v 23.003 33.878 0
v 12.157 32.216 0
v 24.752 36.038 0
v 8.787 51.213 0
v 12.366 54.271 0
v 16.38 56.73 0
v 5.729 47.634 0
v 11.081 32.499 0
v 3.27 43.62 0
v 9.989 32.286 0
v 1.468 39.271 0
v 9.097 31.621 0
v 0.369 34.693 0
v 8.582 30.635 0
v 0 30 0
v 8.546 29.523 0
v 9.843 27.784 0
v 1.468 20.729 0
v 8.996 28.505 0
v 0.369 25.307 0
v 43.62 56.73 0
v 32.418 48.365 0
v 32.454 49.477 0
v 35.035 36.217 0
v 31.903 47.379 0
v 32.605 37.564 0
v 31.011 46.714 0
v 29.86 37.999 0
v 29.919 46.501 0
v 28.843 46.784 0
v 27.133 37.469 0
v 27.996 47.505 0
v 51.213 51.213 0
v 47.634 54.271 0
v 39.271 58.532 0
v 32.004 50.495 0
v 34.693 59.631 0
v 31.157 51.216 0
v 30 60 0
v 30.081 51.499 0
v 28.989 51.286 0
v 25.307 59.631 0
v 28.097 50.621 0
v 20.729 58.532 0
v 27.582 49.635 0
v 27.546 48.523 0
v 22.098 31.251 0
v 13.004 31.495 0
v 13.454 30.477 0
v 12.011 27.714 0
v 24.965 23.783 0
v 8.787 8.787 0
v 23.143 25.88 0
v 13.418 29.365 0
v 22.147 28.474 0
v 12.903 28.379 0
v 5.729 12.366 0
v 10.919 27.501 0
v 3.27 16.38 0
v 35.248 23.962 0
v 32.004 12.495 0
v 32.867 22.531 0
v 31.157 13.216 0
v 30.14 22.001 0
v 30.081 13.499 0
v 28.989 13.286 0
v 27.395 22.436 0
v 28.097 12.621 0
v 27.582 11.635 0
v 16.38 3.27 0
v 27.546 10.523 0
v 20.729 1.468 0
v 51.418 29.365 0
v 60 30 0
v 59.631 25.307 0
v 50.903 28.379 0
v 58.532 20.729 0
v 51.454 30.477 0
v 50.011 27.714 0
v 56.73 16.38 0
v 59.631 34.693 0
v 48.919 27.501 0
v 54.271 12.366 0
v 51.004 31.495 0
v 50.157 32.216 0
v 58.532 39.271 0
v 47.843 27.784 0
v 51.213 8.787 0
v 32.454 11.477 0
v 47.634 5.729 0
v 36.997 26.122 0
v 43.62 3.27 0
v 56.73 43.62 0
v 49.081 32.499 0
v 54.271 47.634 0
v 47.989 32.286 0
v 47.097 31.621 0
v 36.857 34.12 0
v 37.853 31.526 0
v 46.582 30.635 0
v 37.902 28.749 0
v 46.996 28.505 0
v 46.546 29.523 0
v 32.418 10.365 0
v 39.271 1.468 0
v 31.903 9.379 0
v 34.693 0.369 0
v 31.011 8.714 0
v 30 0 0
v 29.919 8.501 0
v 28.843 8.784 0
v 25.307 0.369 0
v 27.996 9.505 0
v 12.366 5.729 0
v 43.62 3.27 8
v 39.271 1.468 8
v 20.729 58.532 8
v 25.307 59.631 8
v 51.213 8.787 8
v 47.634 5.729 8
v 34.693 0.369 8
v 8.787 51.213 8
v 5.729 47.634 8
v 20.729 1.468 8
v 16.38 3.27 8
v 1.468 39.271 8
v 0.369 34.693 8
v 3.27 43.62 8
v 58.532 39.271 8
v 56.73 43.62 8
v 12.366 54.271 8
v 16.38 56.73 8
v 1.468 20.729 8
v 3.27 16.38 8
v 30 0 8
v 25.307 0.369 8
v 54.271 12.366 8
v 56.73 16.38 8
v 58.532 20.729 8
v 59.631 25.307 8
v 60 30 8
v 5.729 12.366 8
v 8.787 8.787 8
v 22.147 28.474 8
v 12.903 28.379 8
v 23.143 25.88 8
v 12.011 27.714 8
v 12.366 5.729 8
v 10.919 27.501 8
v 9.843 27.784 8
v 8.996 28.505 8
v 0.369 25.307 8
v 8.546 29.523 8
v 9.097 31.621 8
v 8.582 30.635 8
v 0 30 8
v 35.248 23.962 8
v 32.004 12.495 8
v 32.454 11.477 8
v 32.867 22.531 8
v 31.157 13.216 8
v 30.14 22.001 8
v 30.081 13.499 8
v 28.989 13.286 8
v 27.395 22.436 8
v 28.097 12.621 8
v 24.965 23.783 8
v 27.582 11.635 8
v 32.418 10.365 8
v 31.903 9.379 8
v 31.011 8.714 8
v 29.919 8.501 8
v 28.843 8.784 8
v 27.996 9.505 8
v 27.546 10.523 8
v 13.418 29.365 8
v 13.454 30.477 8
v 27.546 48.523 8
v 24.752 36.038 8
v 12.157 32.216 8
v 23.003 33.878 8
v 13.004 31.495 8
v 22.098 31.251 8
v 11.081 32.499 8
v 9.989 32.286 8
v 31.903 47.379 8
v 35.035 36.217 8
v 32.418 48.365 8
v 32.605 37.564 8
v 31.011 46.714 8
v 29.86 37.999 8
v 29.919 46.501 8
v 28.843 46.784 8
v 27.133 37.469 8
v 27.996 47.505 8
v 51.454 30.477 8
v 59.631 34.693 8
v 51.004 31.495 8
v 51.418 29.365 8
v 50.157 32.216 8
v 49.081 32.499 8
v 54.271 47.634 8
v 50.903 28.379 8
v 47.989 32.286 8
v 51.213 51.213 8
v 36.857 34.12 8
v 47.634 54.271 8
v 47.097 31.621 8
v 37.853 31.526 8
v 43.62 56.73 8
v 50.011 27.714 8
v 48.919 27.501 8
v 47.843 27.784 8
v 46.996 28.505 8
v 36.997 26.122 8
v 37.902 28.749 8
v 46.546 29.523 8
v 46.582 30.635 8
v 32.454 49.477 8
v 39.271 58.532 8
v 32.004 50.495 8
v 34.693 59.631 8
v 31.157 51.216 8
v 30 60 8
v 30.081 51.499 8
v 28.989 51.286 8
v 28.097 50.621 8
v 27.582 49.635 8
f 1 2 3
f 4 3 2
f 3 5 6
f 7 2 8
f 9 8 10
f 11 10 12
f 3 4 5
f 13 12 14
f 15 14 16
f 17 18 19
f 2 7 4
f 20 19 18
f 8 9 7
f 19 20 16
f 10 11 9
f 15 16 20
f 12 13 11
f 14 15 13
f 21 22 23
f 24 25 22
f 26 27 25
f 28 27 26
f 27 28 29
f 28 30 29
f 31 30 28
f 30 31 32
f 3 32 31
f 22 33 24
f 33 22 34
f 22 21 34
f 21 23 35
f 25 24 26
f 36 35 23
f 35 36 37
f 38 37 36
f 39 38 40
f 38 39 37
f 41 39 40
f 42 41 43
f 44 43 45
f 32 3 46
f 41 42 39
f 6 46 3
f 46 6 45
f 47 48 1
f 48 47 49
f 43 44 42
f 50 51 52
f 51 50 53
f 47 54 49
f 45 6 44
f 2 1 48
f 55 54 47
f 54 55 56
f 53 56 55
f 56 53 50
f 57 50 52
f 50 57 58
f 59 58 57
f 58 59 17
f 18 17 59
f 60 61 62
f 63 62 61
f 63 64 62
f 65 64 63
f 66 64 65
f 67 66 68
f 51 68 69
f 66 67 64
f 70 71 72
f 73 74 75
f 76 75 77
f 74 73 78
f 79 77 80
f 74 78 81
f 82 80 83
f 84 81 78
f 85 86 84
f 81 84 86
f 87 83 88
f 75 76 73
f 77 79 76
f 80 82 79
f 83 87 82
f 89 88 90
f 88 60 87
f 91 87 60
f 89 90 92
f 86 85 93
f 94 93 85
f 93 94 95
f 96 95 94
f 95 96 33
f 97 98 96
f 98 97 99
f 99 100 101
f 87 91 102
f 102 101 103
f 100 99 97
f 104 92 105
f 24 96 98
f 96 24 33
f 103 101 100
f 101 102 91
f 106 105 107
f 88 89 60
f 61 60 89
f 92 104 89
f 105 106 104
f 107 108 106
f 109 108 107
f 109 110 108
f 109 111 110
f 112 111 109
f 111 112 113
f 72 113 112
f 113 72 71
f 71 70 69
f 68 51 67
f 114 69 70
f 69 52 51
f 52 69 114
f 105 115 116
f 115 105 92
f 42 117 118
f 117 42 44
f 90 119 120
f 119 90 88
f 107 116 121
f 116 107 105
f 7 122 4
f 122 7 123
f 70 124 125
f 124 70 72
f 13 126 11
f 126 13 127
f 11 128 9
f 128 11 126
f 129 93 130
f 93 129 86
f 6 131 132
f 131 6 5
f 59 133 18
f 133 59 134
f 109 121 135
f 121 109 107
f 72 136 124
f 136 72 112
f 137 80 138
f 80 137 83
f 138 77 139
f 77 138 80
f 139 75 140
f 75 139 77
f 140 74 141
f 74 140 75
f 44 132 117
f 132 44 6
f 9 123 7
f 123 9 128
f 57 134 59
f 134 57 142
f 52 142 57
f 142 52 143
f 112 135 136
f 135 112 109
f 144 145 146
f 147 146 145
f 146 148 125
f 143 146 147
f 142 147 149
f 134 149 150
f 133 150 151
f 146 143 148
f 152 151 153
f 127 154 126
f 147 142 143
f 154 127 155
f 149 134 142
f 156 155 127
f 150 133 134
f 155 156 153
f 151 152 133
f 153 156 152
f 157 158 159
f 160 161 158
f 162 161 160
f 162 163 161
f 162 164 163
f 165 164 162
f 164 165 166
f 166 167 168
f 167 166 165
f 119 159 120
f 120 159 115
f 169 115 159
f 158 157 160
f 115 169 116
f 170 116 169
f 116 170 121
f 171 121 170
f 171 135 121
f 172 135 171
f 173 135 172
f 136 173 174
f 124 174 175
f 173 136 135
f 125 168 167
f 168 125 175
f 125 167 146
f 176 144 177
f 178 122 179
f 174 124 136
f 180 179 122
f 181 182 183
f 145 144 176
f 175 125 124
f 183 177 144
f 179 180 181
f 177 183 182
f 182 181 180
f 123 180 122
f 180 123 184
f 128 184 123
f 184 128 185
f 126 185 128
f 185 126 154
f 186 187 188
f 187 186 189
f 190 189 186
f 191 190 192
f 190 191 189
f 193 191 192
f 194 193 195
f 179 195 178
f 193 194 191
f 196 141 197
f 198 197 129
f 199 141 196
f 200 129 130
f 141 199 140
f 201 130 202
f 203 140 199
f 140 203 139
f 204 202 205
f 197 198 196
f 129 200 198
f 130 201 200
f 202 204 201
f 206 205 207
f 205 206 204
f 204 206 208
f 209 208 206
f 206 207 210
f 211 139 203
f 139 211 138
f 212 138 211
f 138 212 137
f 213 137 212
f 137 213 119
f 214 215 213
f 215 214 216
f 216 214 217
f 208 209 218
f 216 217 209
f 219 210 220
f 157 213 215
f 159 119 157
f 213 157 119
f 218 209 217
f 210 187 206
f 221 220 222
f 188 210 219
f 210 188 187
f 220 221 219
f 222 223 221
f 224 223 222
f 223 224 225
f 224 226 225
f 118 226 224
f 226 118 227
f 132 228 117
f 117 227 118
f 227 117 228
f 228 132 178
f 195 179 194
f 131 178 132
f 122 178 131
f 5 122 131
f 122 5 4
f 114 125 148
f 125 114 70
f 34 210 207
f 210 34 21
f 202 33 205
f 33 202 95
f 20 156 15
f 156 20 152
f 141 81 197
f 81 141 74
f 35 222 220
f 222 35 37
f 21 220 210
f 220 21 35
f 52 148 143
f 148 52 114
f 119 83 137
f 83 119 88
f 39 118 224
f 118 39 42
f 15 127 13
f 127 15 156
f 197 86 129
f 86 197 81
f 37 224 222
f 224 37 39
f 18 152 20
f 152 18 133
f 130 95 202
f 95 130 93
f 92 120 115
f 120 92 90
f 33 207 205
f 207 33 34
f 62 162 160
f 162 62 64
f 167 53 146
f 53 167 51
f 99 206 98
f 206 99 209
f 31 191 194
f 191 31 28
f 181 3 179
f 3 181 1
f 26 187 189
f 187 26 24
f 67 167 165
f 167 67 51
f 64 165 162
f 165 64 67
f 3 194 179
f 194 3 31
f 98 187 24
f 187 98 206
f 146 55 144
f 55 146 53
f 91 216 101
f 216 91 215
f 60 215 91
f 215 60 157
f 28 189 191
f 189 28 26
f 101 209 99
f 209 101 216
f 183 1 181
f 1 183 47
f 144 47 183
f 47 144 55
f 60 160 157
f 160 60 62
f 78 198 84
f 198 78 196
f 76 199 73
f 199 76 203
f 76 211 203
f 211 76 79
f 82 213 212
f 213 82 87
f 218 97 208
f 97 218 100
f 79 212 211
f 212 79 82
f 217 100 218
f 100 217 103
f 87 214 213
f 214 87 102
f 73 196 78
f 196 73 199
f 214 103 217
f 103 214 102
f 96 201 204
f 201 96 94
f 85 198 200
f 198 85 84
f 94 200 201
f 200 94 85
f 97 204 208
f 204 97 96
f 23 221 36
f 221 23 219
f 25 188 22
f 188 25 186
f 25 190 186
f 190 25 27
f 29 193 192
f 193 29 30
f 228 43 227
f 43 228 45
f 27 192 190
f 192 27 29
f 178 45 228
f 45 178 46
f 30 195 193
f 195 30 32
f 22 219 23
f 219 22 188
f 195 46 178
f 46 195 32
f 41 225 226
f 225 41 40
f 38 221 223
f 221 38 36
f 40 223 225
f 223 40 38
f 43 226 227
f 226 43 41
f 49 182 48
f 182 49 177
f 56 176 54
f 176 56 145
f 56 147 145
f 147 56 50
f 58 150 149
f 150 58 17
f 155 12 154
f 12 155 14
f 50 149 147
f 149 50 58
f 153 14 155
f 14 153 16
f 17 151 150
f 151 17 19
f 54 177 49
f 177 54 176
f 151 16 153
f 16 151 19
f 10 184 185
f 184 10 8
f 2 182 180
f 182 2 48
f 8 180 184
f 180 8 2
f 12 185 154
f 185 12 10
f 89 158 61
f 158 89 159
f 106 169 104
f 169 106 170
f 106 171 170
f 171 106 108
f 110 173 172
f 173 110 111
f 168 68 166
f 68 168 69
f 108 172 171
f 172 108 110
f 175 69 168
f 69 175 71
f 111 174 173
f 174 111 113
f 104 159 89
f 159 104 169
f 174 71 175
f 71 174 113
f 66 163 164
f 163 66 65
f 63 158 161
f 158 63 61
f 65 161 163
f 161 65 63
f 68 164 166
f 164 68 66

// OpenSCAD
$fn = 32;

// ----------------------------------------------------------------------
// Spacer plate: round flange R30, 4 bolts
// ----------------------------------------------------------------------

// --- parameters (mm) ---
bore_r = 8;               // centre bore radius
bolt_r = 2.5;             // bolt hole radius
plate_t = 8;              // plate thickness, Z (extrusion height)
flange_r = 30;            // flange radius
n_bolt = 4;               // bolt hole count
ring_r = 19;              // bolt circle radius

profile = [[60, 30], [59.631, 34.693], [58.532, 39.271], [56.73, 43.62], [54.271, 47.634], [51.213, 51.213], [47.634, 54.271], [43.62, 56.73], [39.271, 58.532], [34.693, 59.631], [30, 60], [25.307, 59.631], [20.729, 58.532], [16.38, 56.73], [12.366, 54.271], [8.787, 51.213], [5.729, 47.634], [3.27, 43.62], [1.468, 39.271], [0.369, 34.693], [0, 30], [0.369, 25.307], [1.468, 20.729], [3.27, 16.38], [5.729, 12.366], [8.787, 8.787], [12.366, 5.729], [16.38, 3.27], [20.729, 1.468], [25.307, 0.369], [30, 0], [34.693, 0.369], [39.271, 1.468], [43.62, 3.27], [47.634, 5.729], [51.213, 8.787], [54.271, 12.366], [56.73, 16.38], [58.532, 20.729], [59.631, 25.307]];  // primary outline, 40 points, counter clockwise
void_1 = [[37.853, 31.526], [36.857, 34.12], [35.035, 36.217], [32.605, 37.564], [29.86, 37.999], [27.133, 37.469], [24.752, 36.038], [23.003, 33.878], [22.098, 31.251], [22.147, 28.474], [23.143, 25.88], [24.965, 23.783], [27.395, 22.436], [30.14, 22.001], [32.867, 22.531], [35.248, 23.962], [36.997, 26.122], [37.902, 28.749]];  // centre bore, 18 points
void_2 = [[51.454, 30.477], [51.004, 31.495], [50.157, 32.216], [49.081, 32.499], [47.989, 32.286], [47.097, 31.621], [46.582, 30.635], [46.546, 29.523], [46.996, 28.505], [47.843, 27.784], [48.919, 27.501], [50.011, 27.714], [50.903, 28.379], [51.418, 29.365]];  // bolt hole 1, 14 points
void_3 = [[32.454, 49.477], [32.004, 50.495], [31.157, 51.216], [30.081, 51.499], [28.989, 51.286], [28.097, 50.621], [27.582, 49.635], [27.546, 48.523], [27.996, 47.505], [28.843, 46.784], [29.919, 46.501], [31.011, 46.714], [31.903, 47.379], [32.418, 48.365]];  // bolt hole 2, 14 points
void_4 = [[13.454, 30.477], [13.004, 31.495], [12.157, 32.216], [11.081, 32.499], [9.989, 32.286], [9.097, 31.621], [8.582, 30.635], [8.546, 29.523], [8.996, 28.505], [9.843, 27.784], [10.919, 27.501], [12.011, 27.714], [12.903, 28.379], [13.418, 29.365]];  // bolt hole 3, 14 points
void_5 = [[32.454, 11.477], [32.004, 12.495], [31.157, 13.216], [30.081, 13.499], [28.989, 13.286], [28.097, 12.621], [27.582, 11.635], [27.546, 10.523], [27.996, 9.505], [28.843, 8.784], [29.919, 8.501], [31.011, 8.714], [31.903, 9.379], [32.418, 10.365]];  // bolt hole 4, 14 points

// --- the one profile operation ---
difference() {
  linear_extrude(height = plate_t) polygon(points = profile);
  translate([0, 0, -1])
    linear_extrude(height = plate_t + 2) polygon(points = void_1);
  translate([0, 0, -1])
    linear_extrude(height = plate_t + 2) polygon(points = void_2);
  translate([0, 0, -1])
    linear_extrude(height = plate_t + 2) polygon(points = void_3);
  translate([0, 0, -1])
    linear_extrude(height = plate_t + 2) polygon(points = void_4);
  translate([0, 0, -1])
    linear_extrude(height = plate_t + 2) polygon(points = void_5);
}
